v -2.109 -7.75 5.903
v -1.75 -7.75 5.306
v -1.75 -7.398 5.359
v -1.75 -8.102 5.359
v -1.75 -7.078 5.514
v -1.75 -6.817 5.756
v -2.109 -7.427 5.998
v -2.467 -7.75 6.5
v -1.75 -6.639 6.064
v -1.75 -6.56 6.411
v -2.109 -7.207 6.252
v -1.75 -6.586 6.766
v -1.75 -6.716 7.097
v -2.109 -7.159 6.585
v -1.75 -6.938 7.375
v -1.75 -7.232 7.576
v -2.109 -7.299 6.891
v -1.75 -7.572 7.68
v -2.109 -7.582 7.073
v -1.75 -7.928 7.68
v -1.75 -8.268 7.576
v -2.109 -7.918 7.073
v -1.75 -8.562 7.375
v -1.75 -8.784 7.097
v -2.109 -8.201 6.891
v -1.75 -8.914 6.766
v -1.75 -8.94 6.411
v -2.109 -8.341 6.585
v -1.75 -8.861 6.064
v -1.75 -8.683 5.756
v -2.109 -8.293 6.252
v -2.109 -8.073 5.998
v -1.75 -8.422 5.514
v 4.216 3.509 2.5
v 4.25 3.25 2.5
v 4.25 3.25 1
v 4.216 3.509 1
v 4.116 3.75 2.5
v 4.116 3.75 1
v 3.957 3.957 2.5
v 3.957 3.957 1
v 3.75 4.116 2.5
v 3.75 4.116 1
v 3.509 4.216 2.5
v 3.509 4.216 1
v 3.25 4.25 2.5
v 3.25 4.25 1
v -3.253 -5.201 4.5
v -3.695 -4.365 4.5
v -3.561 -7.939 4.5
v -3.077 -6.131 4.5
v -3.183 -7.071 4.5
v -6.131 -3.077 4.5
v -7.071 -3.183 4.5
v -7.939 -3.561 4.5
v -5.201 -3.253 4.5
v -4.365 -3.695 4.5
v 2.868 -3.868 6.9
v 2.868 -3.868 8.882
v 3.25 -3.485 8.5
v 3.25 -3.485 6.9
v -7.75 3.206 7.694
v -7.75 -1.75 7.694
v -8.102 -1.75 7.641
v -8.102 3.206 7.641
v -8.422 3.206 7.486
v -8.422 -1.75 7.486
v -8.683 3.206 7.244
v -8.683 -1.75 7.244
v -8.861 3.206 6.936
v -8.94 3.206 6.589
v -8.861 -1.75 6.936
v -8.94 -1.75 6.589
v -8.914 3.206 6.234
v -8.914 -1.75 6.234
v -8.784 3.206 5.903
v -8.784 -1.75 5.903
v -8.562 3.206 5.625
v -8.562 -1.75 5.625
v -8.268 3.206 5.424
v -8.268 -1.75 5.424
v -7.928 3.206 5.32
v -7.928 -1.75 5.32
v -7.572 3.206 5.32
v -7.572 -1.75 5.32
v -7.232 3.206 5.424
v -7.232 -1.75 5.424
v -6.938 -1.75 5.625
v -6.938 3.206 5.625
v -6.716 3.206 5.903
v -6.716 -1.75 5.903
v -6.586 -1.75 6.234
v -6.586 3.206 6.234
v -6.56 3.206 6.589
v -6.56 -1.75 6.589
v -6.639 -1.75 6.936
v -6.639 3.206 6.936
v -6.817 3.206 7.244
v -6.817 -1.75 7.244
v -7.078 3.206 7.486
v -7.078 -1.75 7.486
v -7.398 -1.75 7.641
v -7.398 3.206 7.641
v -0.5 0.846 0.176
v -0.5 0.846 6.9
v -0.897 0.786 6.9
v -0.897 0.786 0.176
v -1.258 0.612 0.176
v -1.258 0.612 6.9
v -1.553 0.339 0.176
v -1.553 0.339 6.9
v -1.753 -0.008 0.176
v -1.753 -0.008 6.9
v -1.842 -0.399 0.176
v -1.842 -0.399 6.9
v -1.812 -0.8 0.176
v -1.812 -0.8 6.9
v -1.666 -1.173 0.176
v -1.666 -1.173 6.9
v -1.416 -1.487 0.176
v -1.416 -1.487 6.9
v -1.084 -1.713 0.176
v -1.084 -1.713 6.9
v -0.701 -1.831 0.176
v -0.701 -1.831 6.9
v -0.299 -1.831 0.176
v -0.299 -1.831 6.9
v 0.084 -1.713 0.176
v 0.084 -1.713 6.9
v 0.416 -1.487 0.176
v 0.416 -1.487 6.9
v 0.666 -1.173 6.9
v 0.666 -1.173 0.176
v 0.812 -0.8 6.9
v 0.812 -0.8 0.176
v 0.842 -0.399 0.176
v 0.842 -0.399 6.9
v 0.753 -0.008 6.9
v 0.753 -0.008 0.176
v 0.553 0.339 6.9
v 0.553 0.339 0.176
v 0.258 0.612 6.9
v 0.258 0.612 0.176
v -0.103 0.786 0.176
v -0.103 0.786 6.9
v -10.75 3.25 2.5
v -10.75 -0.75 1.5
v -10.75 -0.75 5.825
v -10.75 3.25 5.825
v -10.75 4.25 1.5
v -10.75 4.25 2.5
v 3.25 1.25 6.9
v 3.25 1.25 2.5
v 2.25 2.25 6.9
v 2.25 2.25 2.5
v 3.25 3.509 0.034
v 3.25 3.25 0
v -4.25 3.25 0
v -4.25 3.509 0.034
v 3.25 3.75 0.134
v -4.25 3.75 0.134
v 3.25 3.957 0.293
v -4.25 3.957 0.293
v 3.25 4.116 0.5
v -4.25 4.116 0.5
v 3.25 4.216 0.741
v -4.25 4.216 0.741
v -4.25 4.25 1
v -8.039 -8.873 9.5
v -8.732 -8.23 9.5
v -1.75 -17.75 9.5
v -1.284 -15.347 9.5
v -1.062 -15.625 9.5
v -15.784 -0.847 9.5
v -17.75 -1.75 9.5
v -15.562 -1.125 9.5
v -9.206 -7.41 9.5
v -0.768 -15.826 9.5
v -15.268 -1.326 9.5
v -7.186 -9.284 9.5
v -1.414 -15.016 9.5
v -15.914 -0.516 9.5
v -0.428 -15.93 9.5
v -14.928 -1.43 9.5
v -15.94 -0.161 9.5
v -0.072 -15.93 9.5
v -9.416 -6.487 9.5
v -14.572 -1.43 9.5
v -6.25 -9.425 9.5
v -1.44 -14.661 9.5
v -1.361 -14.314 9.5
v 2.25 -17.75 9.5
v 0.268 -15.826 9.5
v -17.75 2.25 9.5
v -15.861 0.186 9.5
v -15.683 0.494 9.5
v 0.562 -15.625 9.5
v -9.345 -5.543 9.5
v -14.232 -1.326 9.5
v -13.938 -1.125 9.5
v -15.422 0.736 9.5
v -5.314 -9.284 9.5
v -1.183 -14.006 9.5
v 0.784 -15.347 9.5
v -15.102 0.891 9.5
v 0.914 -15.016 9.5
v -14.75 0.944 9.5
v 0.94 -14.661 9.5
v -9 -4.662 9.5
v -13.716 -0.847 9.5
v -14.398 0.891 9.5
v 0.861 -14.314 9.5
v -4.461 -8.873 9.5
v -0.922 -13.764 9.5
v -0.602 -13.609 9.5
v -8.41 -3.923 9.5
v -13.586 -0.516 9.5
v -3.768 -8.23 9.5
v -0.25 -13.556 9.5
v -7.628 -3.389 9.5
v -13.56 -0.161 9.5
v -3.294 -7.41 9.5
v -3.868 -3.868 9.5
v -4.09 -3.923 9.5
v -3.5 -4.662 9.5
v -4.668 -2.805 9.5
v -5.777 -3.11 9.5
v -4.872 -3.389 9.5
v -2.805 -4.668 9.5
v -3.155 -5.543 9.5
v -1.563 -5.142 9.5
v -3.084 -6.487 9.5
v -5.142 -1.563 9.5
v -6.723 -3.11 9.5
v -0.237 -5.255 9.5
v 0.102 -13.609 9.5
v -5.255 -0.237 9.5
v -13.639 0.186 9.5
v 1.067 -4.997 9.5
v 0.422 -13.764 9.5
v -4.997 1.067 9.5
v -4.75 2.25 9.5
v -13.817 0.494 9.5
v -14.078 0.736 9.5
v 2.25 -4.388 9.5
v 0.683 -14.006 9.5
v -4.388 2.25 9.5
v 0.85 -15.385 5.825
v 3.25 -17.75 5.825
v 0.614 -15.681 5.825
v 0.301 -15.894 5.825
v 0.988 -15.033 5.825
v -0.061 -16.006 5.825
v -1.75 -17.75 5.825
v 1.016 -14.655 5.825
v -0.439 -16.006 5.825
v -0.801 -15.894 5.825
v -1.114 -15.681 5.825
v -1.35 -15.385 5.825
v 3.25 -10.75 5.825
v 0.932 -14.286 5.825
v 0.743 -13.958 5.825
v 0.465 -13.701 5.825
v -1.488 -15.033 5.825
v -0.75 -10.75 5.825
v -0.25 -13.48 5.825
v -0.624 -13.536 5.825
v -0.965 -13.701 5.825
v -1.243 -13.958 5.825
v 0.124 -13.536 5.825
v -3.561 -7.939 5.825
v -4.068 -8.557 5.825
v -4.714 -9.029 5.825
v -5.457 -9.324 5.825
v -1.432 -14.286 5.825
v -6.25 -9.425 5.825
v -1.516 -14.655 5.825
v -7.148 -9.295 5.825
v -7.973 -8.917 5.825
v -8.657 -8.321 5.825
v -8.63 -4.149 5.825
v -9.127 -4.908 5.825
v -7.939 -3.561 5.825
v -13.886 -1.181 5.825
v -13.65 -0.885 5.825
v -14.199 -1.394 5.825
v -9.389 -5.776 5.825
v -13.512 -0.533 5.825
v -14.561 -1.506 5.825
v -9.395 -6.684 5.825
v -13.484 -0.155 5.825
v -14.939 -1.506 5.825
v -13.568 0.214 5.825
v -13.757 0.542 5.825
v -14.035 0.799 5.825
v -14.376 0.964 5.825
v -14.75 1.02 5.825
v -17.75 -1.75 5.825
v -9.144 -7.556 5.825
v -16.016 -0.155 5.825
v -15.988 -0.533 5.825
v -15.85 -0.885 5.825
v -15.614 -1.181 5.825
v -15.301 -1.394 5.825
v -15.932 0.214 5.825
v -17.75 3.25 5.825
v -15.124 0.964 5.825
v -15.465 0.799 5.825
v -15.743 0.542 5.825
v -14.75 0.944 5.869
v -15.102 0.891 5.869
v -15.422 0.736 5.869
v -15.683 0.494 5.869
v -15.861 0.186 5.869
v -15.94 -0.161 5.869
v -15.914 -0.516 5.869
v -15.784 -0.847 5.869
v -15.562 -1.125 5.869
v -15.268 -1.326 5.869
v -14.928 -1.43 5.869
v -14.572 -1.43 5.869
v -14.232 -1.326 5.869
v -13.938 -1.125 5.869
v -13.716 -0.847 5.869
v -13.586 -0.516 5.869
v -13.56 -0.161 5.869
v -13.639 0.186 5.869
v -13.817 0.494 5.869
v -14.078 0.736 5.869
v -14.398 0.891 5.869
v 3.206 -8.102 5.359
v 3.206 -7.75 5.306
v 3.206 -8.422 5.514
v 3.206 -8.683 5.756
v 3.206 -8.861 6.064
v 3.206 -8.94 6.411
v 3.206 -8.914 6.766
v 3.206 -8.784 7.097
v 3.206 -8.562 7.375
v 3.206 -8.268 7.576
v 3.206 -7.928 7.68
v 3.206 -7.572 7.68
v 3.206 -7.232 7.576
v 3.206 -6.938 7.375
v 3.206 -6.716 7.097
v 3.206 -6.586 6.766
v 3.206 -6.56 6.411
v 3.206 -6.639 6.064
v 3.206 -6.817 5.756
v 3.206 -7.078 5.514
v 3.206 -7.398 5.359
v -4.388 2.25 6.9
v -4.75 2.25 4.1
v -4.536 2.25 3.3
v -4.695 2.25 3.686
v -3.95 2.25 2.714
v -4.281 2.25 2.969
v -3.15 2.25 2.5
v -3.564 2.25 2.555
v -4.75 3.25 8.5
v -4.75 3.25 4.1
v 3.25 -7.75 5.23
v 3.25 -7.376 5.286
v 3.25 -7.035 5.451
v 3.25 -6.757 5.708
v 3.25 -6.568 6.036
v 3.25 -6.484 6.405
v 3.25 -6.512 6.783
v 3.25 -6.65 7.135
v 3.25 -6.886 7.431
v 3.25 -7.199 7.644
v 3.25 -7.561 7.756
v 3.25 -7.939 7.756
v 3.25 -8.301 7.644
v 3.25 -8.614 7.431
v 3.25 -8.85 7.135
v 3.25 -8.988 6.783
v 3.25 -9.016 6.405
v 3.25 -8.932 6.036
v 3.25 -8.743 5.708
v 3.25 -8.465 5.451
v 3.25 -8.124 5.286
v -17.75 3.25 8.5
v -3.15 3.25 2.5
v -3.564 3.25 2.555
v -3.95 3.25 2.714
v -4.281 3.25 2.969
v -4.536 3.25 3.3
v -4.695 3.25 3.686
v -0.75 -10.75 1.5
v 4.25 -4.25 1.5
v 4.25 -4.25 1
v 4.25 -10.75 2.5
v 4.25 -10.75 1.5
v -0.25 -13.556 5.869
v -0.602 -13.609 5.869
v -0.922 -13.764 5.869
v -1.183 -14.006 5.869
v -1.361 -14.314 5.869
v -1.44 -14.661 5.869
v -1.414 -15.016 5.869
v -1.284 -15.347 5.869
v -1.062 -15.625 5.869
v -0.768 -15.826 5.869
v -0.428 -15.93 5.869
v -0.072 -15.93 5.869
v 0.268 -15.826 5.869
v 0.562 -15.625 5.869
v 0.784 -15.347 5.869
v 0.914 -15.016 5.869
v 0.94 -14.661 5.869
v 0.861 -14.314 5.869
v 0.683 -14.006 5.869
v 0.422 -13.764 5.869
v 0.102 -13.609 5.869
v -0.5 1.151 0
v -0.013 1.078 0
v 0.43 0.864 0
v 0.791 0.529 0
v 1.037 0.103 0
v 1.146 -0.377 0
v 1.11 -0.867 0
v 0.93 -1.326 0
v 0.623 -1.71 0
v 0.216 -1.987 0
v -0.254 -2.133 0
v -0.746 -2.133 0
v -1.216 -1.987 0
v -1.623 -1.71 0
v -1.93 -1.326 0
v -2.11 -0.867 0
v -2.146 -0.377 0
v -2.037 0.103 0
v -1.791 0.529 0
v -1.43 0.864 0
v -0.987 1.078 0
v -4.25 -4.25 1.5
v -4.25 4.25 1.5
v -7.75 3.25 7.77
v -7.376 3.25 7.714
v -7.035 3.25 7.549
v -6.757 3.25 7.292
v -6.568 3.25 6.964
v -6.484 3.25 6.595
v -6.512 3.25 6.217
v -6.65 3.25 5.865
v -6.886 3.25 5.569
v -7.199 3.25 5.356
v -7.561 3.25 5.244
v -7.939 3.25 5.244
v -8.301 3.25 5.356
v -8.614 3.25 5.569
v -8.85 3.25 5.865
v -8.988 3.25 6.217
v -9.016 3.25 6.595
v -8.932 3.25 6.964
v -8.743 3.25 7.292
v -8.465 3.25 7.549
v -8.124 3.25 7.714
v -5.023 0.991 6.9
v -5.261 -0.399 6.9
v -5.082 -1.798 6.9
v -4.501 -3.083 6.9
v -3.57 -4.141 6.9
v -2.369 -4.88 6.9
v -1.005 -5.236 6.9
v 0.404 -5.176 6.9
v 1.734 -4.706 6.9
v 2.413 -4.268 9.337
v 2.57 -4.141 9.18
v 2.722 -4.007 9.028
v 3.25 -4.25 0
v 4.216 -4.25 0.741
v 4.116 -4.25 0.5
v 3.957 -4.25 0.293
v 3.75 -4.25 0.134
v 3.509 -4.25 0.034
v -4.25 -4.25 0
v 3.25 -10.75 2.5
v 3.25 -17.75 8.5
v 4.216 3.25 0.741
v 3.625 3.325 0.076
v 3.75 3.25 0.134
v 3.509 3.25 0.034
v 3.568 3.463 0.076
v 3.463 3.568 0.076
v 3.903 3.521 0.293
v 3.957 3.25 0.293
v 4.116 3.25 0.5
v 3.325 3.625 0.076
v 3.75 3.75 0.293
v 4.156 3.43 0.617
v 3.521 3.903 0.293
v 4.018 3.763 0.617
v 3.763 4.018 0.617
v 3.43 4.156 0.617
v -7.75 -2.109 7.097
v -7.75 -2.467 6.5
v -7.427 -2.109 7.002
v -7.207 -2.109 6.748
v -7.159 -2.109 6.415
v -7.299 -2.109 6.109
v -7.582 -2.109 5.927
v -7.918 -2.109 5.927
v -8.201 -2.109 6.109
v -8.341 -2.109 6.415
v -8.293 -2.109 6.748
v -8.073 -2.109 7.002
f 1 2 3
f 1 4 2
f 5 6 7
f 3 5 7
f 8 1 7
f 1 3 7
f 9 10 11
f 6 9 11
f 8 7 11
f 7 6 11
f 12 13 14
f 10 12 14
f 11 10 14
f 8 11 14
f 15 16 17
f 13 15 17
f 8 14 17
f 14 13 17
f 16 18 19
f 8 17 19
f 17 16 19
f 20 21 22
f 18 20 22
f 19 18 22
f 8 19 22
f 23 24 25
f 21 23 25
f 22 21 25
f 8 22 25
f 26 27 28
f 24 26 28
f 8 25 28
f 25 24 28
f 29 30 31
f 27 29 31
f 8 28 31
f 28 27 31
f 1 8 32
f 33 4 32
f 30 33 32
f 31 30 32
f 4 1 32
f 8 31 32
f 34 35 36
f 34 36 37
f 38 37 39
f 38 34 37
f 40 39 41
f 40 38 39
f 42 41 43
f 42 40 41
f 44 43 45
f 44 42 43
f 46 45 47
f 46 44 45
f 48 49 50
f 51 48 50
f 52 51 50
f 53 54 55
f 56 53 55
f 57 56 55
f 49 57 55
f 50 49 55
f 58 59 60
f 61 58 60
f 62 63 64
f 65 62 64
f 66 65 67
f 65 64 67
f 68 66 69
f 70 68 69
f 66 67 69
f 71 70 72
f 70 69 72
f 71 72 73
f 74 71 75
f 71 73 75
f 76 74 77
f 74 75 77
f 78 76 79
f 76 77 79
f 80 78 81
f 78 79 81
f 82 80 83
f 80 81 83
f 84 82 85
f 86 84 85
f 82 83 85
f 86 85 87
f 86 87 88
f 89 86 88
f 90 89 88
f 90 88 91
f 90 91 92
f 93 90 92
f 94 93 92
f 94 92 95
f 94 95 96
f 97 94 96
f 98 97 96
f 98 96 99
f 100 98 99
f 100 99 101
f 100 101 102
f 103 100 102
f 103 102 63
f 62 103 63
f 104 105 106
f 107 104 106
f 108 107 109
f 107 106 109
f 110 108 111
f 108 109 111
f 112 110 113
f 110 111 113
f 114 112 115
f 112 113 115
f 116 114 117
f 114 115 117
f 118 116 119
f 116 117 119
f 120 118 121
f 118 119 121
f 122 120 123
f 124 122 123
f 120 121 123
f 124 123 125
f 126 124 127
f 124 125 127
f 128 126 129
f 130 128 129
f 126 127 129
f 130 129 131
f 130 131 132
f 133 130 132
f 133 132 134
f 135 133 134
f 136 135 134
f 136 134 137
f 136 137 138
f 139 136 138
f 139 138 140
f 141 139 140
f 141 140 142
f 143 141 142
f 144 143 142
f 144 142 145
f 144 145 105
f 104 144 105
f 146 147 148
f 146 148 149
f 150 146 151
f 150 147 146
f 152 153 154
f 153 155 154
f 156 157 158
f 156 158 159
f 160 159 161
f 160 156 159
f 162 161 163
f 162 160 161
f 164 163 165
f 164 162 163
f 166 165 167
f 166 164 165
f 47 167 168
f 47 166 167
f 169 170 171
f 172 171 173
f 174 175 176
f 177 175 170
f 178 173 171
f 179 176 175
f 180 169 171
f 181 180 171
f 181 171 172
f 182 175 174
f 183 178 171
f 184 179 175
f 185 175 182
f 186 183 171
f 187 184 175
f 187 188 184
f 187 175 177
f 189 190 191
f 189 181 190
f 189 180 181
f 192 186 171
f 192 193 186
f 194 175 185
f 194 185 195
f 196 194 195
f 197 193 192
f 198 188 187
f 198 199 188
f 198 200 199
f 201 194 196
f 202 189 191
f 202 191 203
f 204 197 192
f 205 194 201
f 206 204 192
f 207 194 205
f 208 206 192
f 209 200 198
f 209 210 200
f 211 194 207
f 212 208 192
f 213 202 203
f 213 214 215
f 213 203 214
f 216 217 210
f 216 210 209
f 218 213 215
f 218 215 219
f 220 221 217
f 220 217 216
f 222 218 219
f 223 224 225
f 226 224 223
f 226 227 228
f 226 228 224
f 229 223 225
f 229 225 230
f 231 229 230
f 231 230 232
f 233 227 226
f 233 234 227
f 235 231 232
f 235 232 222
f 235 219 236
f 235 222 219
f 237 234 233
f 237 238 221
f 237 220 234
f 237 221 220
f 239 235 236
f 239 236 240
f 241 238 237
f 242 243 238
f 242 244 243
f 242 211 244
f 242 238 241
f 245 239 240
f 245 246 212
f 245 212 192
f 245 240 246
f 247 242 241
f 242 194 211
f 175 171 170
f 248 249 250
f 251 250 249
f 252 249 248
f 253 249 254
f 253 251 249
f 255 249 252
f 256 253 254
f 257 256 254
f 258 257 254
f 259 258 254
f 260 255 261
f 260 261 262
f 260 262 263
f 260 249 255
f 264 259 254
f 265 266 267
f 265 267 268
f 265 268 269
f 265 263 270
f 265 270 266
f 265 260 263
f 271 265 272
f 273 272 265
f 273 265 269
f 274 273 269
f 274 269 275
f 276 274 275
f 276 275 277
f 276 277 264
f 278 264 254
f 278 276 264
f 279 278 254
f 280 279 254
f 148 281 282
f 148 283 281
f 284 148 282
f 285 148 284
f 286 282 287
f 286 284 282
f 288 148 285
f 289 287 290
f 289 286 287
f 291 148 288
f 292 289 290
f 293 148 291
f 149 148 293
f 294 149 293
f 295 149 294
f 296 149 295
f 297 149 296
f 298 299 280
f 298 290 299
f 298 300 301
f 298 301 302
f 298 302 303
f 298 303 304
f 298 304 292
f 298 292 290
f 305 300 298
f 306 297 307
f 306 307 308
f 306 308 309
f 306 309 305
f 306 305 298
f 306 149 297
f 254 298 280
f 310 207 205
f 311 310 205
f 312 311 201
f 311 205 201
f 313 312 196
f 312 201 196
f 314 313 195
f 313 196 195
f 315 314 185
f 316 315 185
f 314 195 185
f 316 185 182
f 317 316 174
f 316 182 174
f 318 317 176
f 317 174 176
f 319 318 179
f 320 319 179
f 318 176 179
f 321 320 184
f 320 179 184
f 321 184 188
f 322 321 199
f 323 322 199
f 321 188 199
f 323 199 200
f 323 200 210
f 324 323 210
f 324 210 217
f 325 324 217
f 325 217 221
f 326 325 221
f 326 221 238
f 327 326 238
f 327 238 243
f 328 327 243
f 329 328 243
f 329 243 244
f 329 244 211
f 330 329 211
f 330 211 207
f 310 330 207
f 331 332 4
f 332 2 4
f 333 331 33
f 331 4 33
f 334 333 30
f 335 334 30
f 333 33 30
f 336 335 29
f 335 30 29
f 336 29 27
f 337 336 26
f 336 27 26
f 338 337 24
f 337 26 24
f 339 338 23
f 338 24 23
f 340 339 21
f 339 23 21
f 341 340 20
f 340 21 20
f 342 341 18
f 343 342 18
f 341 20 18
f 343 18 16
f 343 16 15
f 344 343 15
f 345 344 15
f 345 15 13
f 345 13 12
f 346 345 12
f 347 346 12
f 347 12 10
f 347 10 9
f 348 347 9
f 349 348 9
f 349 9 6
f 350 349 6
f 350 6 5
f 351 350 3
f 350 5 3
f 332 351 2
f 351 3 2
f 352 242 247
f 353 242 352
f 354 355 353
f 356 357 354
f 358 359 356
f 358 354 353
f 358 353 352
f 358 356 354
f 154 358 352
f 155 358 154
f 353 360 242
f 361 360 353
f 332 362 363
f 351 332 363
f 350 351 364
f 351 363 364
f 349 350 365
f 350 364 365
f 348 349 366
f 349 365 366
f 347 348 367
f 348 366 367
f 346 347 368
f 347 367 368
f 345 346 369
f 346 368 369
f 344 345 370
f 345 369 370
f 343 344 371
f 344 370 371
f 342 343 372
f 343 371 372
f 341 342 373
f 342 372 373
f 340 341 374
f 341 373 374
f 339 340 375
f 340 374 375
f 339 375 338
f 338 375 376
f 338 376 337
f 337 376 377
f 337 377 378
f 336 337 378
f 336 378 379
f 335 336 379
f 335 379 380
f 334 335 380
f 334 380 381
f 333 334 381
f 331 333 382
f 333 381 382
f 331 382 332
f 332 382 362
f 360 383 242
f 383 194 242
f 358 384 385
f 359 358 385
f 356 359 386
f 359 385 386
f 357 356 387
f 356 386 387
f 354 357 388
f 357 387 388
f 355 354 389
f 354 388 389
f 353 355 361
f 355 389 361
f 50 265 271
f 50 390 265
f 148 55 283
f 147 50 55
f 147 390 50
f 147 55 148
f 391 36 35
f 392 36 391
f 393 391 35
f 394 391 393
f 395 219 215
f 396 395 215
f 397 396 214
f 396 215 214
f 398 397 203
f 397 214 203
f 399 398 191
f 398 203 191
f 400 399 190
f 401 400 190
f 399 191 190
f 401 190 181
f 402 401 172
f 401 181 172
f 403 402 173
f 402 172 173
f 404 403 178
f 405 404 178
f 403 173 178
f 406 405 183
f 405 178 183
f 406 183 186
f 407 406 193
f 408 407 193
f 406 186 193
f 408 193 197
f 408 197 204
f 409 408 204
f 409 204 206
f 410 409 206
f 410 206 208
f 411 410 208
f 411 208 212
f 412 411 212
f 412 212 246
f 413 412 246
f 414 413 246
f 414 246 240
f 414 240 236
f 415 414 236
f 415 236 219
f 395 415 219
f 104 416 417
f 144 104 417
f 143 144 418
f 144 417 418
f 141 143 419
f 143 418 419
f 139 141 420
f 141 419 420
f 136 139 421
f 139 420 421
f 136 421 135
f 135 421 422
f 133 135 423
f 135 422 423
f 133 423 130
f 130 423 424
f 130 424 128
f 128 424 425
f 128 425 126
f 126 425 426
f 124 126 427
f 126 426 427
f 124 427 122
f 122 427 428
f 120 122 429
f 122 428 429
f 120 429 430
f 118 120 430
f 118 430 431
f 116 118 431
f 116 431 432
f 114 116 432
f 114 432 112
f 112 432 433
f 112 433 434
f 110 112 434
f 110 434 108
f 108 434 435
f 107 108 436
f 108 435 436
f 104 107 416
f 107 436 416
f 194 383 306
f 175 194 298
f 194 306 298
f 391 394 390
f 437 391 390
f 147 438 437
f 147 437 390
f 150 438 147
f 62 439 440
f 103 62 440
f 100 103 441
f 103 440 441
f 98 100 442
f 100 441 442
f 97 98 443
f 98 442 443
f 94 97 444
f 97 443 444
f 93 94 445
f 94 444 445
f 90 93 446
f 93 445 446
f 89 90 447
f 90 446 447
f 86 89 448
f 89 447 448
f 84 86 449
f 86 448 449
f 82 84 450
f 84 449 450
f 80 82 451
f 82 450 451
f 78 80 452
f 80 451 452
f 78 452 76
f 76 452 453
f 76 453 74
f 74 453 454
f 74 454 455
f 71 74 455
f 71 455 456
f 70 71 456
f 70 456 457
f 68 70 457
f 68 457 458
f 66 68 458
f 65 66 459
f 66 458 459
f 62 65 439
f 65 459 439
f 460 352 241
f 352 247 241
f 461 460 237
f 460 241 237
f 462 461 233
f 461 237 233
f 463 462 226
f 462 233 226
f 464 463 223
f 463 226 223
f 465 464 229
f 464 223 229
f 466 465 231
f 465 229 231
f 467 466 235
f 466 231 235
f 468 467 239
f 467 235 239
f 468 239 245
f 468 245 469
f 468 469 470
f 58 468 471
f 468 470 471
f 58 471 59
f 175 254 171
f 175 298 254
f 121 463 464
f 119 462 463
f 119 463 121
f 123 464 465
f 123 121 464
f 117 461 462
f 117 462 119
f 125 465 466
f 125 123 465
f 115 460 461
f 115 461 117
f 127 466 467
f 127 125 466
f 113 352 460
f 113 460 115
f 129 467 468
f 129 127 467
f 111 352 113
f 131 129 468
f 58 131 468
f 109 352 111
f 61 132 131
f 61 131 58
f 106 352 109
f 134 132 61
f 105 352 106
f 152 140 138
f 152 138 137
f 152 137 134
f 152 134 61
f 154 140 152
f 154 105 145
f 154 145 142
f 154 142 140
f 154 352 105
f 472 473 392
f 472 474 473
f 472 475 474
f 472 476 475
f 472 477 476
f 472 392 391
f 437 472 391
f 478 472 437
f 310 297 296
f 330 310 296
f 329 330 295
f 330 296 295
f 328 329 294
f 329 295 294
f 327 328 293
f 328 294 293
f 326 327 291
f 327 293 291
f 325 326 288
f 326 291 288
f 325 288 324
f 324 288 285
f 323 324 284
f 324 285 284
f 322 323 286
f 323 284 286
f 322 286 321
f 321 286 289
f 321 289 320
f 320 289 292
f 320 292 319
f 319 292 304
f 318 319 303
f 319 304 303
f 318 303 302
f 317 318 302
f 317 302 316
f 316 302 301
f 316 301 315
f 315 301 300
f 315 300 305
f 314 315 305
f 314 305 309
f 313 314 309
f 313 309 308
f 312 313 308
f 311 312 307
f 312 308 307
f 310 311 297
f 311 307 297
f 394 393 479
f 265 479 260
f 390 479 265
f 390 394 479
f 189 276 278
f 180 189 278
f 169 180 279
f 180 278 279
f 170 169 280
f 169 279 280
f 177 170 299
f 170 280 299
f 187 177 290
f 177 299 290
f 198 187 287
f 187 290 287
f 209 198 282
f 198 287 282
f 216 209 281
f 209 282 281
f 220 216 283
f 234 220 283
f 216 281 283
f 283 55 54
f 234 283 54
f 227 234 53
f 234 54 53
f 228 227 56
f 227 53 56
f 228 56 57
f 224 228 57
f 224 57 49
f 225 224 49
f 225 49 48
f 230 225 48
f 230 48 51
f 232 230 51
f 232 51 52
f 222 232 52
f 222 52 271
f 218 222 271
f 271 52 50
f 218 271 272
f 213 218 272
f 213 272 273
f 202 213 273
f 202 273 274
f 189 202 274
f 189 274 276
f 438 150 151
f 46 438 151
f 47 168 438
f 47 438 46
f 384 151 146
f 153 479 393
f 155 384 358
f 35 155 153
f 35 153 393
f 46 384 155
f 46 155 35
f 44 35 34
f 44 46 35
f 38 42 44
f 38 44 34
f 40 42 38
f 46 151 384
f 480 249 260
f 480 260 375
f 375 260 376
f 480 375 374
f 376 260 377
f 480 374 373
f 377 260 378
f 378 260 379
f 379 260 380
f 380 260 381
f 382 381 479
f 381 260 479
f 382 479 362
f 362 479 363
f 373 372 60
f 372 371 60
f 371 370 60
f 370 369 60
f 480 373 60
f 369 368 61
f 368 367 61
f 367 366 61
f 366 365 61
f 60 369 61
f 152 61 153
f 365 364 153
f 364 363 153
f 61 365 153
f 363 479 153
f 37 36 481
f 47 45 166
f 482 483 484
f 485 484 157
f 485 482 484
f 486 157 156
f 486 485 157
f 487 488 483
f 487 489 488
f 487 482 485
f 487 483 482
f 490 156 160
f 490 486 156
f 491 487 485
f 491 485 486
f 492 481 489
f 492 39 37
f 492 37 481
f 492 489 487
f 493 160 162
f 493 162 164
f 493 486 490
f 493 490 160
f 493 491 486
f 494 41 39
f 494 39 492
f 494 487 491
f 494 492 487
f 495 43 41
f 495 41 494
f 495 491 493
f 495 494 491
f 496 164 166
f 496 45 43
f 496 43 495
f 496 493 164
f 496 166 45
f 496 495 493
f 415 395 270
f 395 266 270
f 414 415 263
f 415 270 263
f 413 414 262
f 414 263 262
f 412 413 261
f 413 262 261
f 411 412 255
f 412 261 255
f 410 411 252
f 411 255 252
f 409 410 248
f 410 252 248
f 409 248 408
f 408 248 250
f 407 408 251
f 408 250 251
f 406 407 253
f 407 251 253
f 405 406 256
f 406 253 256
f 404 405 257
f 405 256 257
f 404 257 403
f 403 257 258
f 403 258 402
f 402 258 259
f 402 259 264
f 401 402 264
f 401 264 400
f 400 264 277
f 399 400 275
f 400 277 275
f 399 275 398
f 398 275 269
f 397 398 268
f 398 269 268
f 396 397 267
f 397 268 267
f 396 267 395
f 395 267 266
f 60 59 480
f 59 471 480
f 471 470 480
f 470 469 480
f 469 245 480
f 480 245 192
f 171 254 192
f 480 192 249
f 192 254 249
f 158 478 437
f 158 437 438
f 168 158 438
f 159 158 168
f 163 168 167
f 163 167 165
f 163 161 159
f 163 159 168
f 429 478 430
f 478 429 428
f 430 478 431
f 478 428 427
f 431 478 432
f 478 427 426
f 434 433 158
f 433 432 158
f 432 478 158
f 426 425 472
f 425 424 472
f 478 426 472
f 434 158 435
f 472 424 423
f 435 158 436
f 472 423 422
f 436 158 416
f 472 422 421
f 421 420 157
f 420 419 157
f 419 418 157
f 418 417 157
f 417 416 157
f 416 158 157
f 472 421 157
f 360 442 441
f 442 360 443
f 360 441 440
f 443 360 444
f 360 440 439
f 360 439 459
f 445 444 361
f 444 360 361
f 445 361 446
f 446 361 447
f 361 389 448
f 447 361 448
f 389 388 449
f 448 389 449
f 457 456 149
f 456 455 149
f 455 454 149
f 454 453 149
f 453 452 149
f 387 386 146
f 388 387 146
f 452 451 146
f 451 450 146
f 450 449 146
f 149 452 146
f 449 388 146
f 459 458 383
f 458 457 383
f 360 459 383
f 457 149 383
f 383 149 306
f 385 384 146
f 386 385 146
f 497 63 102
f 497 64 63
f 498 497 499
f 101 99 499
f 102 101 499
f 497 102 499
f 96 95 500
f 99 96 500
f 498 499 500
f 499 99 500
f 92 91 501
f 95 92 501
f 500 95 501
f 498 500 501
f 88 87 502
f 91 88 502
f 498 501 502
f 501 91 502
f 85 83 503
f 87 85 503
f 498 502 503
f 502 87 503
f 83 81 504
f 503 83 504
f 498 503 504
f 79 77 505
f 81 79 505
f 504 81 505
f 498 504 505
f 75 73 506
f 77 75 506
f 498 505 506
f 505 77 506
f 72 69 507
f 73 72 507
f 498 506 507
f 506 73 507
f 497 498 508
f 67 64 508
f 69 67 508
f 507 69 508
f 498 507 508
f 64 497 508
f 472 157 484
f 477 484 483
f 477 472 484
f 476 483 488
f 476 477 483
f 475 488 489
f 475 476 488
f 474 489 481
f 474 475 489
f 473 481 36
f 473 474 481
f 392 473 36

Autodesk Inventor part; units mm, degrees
ref_plane "YZ Plane" through (0, 0, 0) normal (1, 0, 0) x (0, 1, 0)
ref_plane "XZ Plane" through (0, 0, 0) normal (0, 1, 0) x (-1, 0, 0)
ref_plane "XY Plane" through (0, 0, 0) normal (0, 0, 1) x (1, 0, 0)
sketch "Sketch1" plane through (0, 0, 0) normal (0, 0, 1) x (1, 0, 0)
  line L0 (-4.25, 4.25) -> (4.25, 4.25)
  line L1 (4.25, 4.25) -> (4.25, -4.25)
  line L2 (4.25, -4.25) -> (-4.25, -4.25)
  line L3 (-4.25, -4.25) -> (-4.25, 4.25)
  point P0 (0, 0)
  dimension "d0" = 8.5
  dimension "d1" = 8.5
  dimension "d2" = 4.25
  dimension "d3" = 4.25
extrude "Extrusion1" add sketch "Sketch1" along normal blind 2.5
fillet "Fillet2" radius 1 3 edges at (4.25, 4.25, 1.25) (4.25, 0, 0) (0, 4.25, 0)
sketch "Sketch10" plane through (0, 0, 2.5) normal (0, 0, 1) x (1, 0, 0)
  line L0 (4.25, 3.25) -> (4.25, -4.25) projected
  line L1 (-4.25, 4.25) -> (3.25, 4.25) projected
  line L2 (3.25, 3.25) -> (-17.75, 3.25)
  line L3 (-17.75, 3.25) -> (-17.75, -17.75)
  line L4 (-17.75, -17.75) -> (3.25, -17.75)
  line L5 (3.25, -17.75) -> (3.25, 3.25)
  point P0 (0, 0)
  dimension "d113" = 1
  dimension "d114" = 1
  dimension "d115" = 21
  dimension "d116" = 21
extrude "Extrusion8" add sketch "Sketch10" along normal blind 7
hole "Hole9" at (3.25, -7.75, 6.5) direction (-1, 0, 0) diameter 2.3876 depth 5 tip angle 118 countersink diameter 2.54 countersink angle 120
hole "Hole10" at (-7.75, 3.25, 6.5) direction (0, -1, 0) diameter 2.3876 depth 5 tip angle 118 countersink diameter 2.54 countersink angle 120
hole "Hole11" at (-6.25, -6.25, 9.5) direction (0, 0, -1) diameter 6.35 depth 5
sketch "Sketch11" plane through (0, 0, 2.5) normal (0, 0, -1) x (-1, 0, 0)
  line L0 (17.75, -17.75) -> (-3.25, -17.75) projected
  line L1 (17.75, 3.25) -> (17.75, -17.75) projected
  line L2 (4.25, 3.25) -> (17.75, 3.25) projected
  line L3 (10.75, 3.25) -> (17.75, 3.25)
  line L4 (17.75, 3.25) -> (17.75, -17.75)
  line L5 (17.75, -17.75) -> (-3.25, -17.75)
  line L6 (-3.25, -17.75) -> (-3.25, -10.75)
  line L7 (-3.25, -10.75) -> (0.75, -10.75)
  line L8 (0.75, -10.75) -> (10.75, -0.75)
  line L9 (10.75, -0.75) -> (10.75, 3.25)
  point P0 (0, 0)
  dimension "d146" = 14
  dimension "d158" = 4
extrude "Extrusion9" cut sketch "Sketch11" against normal blind 3.325
hole "Hole12" at (-0.25, -14.75, 5.825) direction (0, 0, 1) diameter 2.3876 end through all countersink diameter 2.54 countersink angle 120
hole "Hole13" at (-14.75, -0.25, 5.825) direction (0, 0, 1) diameter 2.3876 end through all countersink diameter 2.54 countersink angle 120
chamfer "Chamfer3" distance 16 angle 45 1 edges at (-17.75, -17.75, 7.6625)
chamfer "Chamfer4" distance 1 angle 45 2 edges at (-7.25, 3.25, 9.5) (3.25, -7.25, 9.5)
sketch "Sketch15" plane through (0, 0, 2.5) normal (0, 0, 1) x (1, 0, 0)
  line L0 (-4.25, 3.25) -> (3.25, 3.25) projected
  line L1 (3.25, 3.25) -> (3.25, -4.25) projected
  line L2 (4.25, -4.25) -> (3.25, -4.25) projected
  line L3 (4.25, 3.25) -> (4.25, -4.25) projected
  arc A0 (4.25, 3.25) -> (3.25, 4.25) centre (3.25, 3.25) ccw projected
  line L4 (-4.25, 4.25) -> (3.25, 4.25) projected
  line L5 (-4.25, 3.25) -> (-4.25, 4.25) projected
  point P0 (0, 0)
extrude "Extrusion11" [suppressed]
chamfer "Chamfer6" distance 1 angle 45 1 edges at (3.25, 3.25, 5.5)
hole "Hole16" at (-0.5, -0.5, 0) direction (0, 0, 1) diameter 2.6924 end through all countersink diameter 3.302 countersink angle 120
sketch "Sketch16" plane through (0, 0, 2.5) normal (0, 0, -1) x (-1, 0, 0)
  line L0 (-3.25, -10.75) -> (0.75, -10.75) projected
  line L1 (10.75, -0.75) -> (10.75, 3.25) projected
  line L2 (4.25, 3.25) -> (10.75, 3.25) projected
  line L3 (4.25, -4.25) -> (4.25, 3.25) projected
  line L4 (-3.25, -4.25) -> (4.25, -4.25) projected
  line L5 (-3.25, -10.75) -> (-3.25, -4.25) projected
  line L6 (4.25, 4.25) -> (10.75, 4.25)
  line L7 (10.75, 4.25) -> (10.75, -0.75)
  line L8 (10.75, -0.75) -> (0.75, -10.75)
  line L9 (0.75, -10.75) -> (-4.25, -10.75)
  line L10 (-4.25, -10.75) -> (-4.25, -4.25)
  line L11 (-4.25, -4.25) -> (4.25, -4.25)
  line L12 (4.25, -4.25) -> (4.25, 4.25)
  point P0 (0, 0)
  dimension "d213" = 1
  dimension "d214" = 1
extrude "Extrusion12" add sketch "Sketch16" along normal blind 1
sketch "Sketch17" plane through (0, 0, 9.5) normal (0, 0, 1) x (1, 0, 0)
  circle A0 centre (-0.5, -0.5) radius 1.3462 projected
  arc A1 (5.6176, -1.1176) -> (-1.1176, 5.6176) centre (2.25, 2.25) ccw
  line L0 (-3.8676, 2.8676) -> (-1.1176, 5.6176)
  line L1 (2.8676, -3.8676) -> (5.6176, -1.1176)
  arc A2 (-3.8676, 2.8676) -> (2.8676, -3.8676) centre (-0.5, -0.5) ccw
  line L2 (3.4997, 3.4997) -> (-5.0832, -5.0832) construction
  line L3 (3.25, -17.75) -> (3.25, 2.25) projected
  point P0 (0, 0)
  dimension "d221" = 9.525
  dimension "d222" = 3.75
extrude "Extrusion13" cut sketch "Sketch17" against normal blind 2.6
sketch "Sketch18" plane through (-17.75, 3.25, 5.825) normal (0, 1, 0) x (1, 0, 0)
  line L0 (21, -3.675) -> (13, -3.675)
  line L1 (13, -3.675) -> (13, 1.725)
  line L2 (14.6, 3.325) -> (21, 3.325)
  line L3 (21, 3.325) -> (21, -3.675)
  arc A0 (14.6, 3.325) -> (13, 1.725) centre (14.6, 1.725) ccw
  line L4 (21, -1.075) -> (21, 3.325) projected
  line L5 (20, -3.675) -> (16, -3.675) projected
  line L6 (7, 3.325) -> (21, 3.325) projected
  point P0 (17.75, 5.825)
  dimension "d223" = 1.6
  dimension "d224" = 8
extrude "Extrusion14" cut sketch "Sketch18" against normal blind 1
chamfer "Chamfer7" distance 1 angle 45 1 edges at (3.25, 2.25, 4.7)
properties part number "nub_minusZ_3_plunger" material "Aluminum-6061"
